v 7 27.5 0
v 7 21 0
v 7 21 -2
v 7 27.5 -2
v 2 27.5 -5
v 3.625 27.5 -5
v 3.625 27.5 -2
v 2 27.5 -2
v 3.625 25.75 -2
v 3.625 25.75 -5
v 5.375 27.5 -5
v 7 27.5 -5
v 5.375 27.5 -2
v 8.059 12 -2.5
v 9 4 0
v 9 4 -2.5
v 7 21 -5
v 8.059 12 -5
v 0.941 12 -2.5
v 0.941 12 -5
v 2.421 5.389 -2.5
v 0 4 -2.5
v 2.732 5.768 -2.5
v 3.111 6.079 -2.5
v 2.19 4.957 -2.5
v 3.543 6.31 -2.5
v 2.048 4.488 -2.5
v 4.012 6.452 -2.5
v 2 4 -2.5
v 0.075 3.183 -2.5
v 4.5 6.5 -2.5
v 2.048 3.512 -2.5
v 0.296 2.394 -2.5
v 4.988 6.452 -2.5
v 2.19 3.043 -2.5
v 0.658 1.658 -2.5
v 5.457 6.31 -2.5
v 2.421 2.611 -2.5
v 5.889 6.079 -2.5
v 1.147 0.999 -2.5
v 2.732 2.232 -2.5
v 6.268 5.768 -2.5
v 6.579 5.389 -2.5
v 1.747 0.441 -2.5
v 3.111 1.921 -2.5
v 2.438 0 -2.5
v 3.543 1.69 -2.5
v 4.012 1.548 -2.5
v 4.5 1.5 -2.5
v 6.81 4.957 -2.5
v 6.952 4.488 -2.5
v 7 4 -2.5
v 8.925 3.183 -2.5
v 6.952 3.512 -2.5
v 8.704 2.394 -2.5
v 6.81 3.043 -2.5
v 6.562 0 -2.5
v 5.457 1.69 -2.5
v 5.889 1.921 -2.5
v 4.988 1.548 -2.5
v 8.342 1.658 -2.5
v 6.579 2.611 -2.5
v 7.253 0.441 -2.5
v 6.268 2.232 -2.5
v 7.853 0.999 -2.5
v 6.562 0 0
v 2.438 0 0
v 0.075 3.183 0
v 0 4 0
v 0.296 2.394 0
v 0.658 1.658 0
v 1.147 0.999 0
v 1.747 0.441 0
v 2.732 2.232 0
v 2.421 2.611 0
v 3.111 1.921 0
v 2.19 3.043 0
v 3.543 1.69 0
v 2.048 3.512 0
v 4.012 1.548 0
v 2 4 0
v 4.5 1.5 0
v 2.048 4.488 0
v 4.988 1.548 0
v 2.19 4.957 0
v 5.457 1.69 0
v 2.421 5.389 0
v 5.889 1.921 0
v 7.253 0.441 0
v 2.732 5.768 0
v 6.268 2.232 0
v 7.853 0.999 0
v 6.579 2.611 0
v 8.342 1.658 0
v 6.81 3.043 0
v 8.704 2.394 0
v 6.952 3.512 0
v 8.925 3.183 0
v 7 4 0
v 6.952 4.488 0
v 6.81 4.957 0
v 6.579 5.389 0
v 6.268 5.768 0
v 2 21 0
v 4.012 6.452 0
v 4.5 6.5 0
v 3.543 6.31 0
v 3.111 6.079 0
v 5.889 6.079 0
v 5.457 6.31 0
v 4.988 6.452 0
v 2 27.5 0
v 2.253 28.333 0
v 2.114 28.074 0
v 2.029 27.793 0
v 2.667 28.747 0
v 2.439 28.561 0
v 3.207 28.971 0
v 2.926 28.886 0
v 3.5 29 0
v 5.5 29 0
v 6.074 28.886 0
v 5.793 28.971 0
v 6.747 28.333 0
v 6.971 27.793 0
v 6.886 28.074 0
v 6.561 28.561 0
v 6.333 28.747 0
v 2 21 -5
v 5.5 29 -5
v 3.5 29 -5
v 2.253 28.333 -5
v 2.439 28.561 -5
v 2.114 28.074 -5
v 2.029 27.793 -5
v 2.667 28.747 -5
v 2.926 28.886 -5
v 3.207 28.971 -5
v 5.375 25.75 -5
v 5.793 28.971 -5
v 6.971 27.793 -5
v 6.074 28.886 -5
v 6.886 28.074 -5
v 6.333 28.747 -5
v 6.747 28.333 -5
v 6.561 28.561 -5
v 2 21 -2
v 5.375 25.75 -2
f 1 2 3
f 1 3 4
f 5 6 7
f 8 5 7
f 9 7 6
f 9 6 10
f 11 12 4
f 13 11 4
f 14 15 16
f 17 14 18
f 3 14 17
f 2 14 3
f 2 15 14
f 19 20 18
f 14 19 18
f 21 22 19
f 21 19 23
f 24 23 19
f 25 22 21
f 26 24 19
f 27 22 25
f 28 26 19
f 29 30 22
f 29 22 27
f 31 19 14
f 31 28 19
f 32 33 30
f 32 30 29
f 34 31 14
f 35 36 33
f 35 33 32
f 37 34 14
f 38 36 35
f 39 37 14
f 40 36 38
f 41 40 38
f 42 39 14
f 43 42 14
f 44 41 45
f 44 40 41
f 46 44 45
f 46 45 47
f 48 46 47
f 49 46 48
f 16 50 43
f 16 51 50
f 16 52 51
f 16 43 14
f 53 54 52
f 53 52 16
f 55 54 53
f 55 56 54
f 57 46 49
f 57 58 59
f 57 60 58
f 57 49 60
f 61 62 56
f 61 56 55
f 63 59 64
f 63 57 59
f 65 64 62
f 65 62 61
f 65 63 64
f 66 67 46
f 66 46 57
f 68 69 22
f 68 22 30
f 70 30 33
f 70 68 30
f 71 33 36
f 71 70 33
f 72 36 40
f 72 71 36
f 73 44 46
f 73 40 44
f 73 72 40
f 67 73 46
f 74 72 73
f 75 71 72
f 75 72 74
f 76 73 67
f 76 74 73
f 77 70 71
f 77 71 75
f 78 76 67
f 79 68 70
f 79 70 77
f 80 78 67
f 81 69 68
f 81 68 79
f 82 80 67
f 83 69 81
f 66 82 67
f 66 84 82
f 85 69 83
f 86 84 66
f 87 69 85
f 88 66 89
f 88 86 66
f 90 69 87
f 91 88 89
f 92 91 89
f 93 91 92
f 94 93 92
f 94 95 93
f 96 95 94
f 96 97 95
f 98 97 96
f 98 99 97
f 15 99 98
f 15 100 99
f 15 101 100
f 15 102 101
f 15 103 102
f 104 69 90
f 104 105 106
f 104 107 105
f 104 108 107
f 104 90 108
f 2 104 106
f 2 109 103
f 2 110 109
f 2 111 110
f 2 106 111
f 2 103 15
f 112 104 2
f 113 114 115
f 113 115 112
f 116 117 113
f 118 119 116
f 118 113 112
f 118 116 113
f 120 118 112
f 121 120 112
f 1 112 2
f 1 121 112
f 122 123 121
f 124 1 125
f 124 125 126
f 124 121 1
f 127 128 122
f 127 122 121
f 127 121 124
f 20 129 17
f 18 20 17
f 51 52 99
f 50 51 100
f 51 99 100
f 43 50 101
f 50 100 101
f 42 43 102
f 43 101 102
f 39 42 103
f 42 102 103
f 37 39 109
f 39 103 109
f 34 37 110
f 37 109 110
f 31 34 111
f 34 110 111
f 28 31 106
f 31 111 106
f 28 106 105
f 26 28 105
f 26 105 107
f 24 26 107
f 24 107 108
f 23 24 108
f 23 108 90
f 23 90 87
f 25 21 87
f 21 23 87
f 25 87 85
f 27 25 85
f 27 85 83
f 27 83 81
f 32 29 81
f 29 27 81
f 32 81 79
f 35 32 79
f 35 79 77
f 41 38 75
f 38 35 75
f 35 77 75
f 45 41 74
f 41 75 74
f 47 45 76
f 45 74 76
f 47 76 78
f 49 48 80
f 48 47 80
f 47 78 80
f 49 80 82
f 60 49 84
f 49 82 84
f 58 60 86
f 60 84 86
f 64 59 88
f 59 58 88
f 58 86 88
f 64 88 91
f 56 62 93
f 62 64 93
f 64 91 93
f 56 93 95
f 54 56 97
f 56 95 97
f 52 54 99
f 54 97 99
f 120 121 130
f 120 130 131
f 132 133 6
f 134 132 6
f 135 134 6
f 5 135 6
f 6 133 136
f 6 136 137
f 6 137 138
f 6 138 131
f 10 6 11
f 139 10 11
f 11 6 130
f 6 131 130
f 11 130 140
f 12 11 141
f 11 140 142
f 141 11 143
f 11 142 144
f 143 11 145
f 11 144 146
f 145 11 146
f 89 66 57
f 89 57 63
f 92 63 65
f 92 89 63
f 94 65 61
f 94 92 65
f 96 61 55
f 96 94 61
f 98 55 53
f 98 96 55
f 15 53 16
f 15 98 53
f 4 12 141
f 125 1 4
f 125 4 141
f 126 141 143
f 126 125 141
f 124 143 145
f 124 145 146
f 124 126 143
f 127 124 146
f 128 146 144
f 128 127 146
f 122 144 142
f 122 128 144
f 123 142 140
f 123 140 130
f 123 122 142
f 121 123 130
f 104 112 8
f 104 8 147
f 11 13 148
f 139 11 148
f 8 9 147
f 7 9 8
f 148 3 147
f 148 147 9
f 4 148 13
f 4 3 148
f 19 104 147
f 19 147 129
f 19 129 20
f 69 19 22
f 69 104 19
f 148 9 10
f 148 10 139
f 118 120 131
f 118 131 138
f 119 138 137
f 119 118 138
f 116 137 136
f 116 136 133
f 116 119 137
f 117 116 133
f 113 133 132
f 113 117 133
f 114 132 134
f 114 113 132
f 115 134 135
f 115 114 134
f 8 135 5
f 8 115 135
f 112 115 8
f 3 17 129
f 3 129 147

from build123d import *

# Parameters (mm, degrees)
F0_R     = 2.5
F1_DEPTH = 5
F2_W     = 6.5
F2_H     = 3
F3_DEPTH = 25
F4_W     = 1.75
F4_H     = 1.75
F5_DEPTH = 3
F6_R     = 2.5
F7_DEPTH = 2.5


with BuildPart() as f1:
    # F0 (on Top) → F1 (new body)
    with BuildSketch(Plane.XY):
        with BuildLine():
            ThreePointArc((0, 4), (0.657671, 1.657671), (2.438447, 0))
            Line((2.438447, 0), (6.561553, 0))
            ThreePointArc((6.561553, 0), (8.342329, 1.657671), (9, 4))
            Line((9, 4), (7, 21))
            Line((7, 21), (7, 27.5))
            ThreePointArc((7, 27.5), (6.56066, 28.56066), (5.5, 29))
            Line((5.5, 29), (3.5, 29))
            ThreePointArc((3.5, 29), (2.43934, 28.56066), (2, 27.5))
            Line((2, 27.5), (2, 21))
            Line((2, 21), (0, 4))
        make_face()
        with Locations((4.5, 4)):
            Circle(F0_R, mode=Mode.SUBTRACT)
    extrude(amount=-F1_DEPTH)

    # F2 (on face) → F3 (cut)
    with BuildSketch(Plane.YZ.offset(7)):
        with Locations((24.25, -3.5)):
            Rectangle(F2_W, F2_H)
    extrude(amount=-F3_DEPTH, mode=Mode.SUBTRACT)

    # F4 (on face) → F5 (join, through all)
    with BuildSketch(Plane(origin=(0, 0, -2), x_dir=(1, 0, 0), z_dir=(0, 0, -1))):
        with Locations((4.5, -26.625)):
            Rectangle(F4_W, F4_H)
    extrude(amount=F5_DEPTH)

    # F6 (on face) → F7 (cut)
    with BuildSketch(Plane(origin=(0, 0, -5), x_dir=(1, 0, 0), z_dir=(0, 0, -1))):
        with BuildLine():
            ThreePointArc((2.438447, 0), (0.657671, -1.657671), (0, -4))
            Line((0, -4), (0.941176, -12))
            Line((0.941176, -12), (8.058824, -12))
            Line((8.058824, -12), (9, -4))
            ThreePointArc((9, -4), (8.342329, -1.657671), (6.561553, 0))
            Line((6.561553, 0), (2.438447, 0))
        make_face()
        with Locations((4.5, -4)):
            Circle(F6_R, mode=Mode.SUBTRACT)
    extrude(amount=-F7_DEPTH, mode=Mode.SUBTRACT)


solid = f1.part
